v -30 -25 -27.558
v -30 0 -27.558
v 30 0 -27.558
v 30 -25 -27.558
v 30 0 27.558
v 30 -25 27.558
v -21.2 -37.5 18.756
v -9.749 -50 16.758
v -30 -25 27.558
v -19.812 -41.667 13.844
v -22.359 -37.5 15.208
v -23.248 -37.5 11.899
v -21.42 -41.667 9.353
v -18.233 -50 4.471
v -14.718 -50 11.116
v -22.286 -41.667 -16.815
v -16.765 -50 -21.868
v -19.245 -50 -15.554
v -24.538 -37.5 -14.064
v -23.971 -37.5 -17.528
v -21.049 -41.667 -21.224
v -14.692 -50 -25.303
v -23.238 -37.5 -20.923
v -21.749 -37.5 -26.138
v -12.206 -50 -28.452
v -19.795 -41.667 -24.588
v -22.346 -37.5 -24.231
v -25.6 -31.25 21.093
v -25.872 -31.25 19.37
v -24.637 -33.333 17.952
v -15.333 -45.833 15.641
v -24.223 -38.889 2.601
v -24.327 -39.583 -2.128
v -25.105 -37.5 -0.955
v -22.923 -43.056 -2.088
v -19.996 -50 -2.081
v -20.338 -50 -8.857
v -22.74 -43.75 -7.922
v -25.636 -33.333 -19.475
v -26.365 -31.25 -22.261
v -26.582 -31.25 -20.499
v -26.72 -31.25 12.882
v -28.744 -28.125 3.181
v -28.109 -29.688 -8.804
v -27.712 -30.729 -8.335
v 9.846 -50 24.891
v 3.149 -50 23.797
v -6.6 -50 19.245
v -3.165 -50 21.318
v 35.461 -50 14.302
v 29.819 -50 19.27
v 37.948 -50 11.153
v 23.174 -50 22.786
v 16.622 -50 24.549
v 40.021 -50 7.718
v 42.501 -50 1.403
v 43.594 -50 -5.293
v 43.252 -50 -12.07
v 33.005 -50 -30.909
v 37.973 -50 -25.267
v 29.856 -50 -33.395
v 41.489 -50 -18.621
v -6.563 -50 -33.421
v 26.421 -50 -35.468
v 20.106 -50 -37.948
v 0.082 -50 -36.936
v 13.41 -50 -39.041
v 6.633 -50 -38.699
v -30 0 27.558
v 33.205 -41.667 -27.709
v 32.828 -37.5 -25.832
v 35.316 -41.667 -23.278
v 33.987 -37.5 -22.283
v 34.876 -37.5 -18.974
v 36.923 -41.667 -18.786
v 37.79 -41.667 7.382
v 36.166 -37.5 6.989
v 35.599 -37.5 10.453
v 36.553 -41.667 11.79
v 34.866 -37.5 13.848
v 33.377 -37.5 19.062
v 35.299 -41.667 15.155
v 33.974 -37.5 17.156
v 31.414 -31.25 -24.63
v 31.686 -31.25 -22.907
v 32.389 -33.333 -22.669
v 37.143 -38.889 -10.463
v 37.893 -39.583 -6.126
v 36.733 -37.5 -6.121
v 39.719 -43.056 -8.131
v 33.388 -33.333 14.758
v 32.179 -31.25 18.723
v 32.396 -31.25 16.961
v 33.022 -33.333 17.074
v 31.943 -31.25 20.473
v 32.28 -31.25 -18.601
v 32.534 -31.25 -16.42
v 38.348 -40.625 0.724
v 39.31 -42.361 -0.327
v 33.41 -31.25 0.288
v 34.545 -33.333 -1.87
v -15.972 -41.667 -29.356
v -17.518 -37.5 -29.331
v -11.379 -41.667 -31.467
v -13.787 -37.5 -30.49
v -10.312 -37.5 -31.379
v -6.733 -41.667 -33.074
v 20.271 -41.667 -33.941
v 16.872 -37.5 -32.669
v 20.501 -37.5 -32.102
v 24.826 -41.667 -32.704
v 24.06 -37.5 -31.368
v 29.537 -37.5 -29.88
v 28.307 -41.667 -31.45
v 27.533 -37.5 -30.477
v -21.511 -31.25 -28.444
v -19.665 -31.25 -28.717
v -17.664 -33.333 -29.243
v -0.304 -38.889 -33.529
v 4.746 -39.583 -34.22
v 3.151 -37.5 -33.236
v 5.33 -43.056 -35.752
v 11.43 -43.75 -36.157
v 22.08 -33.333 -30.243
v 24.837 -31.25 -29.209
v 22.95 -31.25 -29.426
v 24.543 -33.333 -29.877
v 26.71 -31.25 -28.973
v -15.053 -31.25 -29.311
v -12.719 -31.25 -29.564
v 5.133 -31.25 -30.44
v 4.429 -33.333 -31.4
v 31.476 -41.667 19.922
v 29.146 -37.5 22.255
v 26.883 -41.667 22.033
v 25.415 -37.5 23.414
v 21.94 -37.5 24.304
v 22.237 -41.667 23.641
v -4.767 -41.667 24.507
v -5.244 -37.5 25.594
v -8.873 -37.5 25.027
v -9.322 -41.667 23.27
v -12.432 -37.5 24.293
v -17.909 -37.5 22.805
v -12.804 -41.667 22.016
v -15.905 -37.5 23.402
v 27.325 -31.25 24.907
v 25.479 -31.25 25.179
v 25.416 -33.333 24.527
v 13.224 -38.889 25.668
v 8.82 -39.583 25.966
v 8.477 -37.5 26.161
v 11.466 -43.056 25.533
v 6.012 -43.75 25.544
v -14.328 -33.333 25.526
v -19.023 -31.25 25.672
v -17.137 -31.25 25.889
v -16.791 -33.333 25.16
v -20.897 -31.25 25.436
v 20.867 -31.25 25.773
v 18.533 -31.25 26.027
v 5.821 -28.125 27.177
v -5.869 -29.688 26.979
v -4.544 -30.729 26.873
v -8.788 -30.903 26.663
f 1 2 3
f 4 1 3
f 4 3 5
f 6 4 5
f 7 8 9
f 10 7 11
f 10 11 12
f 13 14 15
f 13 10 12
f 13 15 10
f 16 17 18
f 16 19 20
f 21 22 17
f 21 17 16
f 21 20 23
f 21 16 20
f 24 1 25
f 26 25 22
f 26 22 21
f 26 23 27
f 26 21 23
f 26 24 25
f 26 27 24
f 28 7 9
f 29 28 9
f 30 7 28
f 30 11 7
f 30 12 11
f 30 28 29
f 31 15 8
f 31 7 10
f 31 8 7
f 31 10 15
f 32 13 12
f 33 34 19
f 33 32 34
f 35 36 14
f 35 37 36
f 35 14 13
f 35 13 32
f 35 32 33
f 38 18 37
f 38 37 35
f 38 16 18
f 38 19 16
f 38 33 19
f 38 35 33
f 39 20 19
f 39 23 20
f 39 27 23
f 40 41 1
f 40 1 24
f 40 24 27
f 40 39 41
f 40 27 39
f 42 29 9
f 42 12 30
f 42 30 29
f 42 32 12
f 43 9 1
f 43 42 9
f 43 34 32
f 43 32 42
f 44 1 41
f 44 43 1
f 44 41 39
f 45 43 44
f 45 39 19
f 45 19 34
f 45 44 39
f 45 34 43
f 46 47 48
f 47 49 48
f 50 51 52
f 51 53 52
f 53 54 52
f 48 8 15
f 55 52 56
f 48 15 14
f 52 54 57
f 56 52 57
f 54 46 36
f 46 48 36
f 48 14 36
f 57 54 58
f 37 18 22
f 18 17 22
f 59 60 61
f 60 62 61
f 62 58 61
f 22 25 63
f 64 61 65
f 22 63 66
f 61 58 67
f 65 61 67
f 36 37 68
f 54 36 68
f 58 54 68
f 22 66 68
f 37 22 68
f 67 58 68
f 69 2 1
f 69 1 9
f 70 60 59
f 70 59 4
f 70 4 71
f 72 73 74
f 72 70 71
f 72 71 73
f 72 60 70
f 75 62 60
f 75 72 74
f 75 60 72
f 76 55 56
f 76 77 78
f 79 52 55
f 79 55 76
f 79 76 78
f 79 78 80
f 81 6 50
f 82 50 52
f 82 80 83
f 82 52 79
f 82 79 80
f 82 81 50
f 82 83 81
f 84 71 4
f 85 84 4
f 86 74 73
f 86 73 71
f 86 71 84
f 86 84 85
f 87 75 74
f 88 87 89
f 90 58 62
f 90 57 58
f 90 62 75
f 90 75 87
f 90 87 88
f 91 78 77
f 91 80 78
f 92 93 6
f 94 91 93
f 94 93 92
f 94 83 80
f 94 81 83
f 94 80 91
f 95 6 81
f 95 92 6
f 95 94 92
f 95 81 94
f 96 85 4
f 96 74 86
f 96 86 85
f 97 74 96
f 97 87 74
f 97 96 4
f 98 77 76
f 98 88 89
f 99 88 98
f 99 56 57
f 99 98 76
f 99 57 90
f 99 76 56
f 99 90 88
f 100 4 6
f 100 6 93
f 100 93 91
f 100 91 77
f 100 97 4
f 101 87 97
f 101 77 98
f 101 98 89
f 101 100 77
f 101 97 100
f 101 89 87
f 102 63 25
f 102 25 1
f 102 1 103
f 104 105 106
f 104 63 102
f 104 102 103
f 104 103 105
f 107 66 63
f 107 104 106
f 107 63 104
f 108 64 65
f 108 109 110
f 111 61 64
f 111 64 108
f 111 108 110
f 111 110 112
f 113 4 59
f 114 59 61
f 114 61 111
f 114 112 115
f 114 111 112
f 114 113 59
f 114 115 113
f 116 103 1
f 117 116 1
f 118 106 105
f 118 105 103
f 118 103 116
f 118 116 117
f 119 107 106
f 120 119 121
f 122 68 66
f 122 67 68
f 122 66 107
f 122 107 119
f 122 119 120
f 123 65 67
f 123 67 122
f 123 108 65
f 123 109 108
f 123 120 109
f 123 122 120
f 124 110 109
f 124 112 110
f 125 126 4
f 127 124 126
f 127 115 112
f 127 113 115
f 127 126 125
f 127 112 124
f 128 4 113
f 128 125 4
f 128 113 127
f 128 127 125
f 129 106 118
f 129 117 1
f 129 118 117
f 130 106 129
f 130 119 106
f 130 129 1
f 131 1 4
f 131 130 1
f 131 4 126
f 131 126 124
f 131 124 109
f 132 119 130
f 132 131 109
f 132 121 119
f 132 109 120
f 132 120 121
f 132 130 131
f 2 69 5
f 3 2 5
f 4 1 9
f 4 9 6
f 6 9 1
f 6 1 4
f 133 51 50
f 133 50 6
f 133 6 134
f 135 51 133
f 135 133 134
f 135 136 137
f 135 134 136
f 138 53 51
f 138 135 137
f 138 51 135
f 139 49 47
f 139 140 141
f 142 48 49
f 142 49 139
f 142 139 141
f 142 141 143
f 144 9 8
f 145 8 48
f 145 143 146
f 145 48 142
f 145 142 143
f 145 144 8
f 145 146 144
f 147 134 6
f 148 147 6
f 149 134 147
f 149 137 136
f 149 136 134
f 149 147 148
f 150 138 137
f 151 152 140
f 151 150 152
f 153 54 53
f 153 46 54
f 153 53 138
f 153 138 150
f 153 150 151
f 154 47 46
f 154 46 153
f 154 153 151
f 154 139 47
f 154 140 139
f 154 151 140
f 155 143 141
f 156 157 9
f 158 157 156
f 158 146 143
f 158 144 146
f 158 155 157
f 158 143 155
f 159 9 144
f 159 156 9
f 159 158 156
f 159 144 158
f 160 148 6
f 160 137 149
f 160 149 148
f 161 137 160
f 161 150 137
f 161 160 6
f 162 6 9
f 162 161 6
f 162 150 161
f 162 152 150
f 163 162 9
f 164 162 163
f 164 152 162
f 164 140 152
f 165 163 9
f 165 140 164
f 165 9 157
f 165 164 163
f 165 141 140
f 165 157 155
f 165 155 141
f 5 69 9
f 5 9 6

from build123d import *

# Parameters (mm, degrees)
F0_W      = 60
F0_H      = 55.1169423331
F1_DEPTH  = 25
F1_FACE_W = 60
F1_FACE_H = 55.1169423331


# Not quite as in the source:
# - the arcs of a loft's sections are written as splines that run evenly, so that the points pair up as in the source's solid


with BuildPart() as f1:
    # F0 (on Front) → F1 (new body)
    with BuildSketch(Plane.XZ):
        Rectangle(F0_W, F0_H)
    extrude(amount=F1_DEPTH)


with BuildPart() as f4:
    # F1_face (on face) → F4 section 0
    with BuildSketch(Plane.XZ.offset(25)):
        Rectangle(F1_FACE_W, F1_FACE_H)
    # F3 (on offset) → F4 section 1
    with BuildSketch(Plane.XZ.offset(50)):
        with BuildLine():
            add(Edge.make_bspline(
                [(33.0049454892, -30.9087265839), (34.5648464401, -29.509604206), (35.9869107002, -27.9568833895), (38.5008560126, -24.6037629645), (39.5926749027, -22.8034462686), (41.4041541174, -19.0243087118), (42.1237696497, -17.0455812976), (43.1631686363, -12.985656746), (43.4829263895, -10.9045599983), (43.7103016279, -6.7198690755), (43.6179134909, -4.6163783752), (43.0245270782, -0.4677364066), (42.5235434753, 1.5773122783), (41.1321989185, 5.5304753085), (40.2418723685, 7.4384919039), (38.1060382588, 11.0442581573), (36.8605835118, 12.7419186555), (35.4614611339, 14.3018196063)],
                knots=[0, 0, 0, 0, 0.125, 0.125, 0.25, 0.25, 0.375, 0.375, 0.5, 0.5, 0.625, 0.625, 0.75, 0.75, 0.875, 0.875, 1, 1, 1, 1], degree=3))
            add(Edge.make_bspline(
                [(35.4614611339, 14.3018196063), (34.0623387561, 15.8617205572), (32.5096179395, 17.2837848173), (29.1564975146, 19.7977301297), (27.3561808187, 20.8895490198), (23.5770432619, 22.7010282345), (21.5983158477, 23.4206437668), (17.5383912961, 24.4600427534), (15.4572945483, 24.7798005066), (11.2726036256, 25.0071757451), (9.1691129253, 24.914787608), (5.0204709567, 24.3214011953), (2.9754222718, 23.8204175924), (-0.9777407584, 22.4290730356), (-2.8857573538, 21.5387464856), (-6.4915236072, 19.4029123759), (-8.1891841054, 18.1574576289), (-9.7490850563, 16.7583352511)],
                knots=[0, 0, 0, 0, 0.125, 0.125, 0.25, 0.25, 0.375, 0.375, 0.5, 0.5, 0.625, 0.625, 0.75, 0.75, 0.875, 0.875, 1, 1, 1, 1], degree=3))
            add(Edge.make_bspline(
                [(-9.7490850563, 16.7583352511), (-11.3089860071, 15.3592128732), (-12.7310502672, 13.8064920567), (-15.2449955797, 10.4533716317), (-16.3368144697, 8.6530549358), (-18.1482936844, 4.873917379), (-18.8679092167, 2.8951899648), (-19.9073082033, -1.1647345868), (-20.2270659565, -3.2458313345), (-20.454441195, -7.4305222573), (-20.3620530579, -9.5340129576), (-19.7686666453, -13.6826549262), (-19.2676830423, -15.7277036111), (-17.8763384856, -19.6808666413), (-16.9860119356, -21.5888832367), (-14.8501778258, -25.1946494901), (-13.6047230788, -26.8923099883), (-12.205600701, -28.4522109391)],
                knots=[0, 0, 0, 0, 0.125, 0.125, 0.25, 0.25, 0.375, 0.375, 0.5, 0.5, 0.625, 0.625, 0.75, 0.75, 0.875, 0.875, 1, 1, 1, 1], degree=3))
            add(Edge.make_bspline(
                [(-12.205600701, -28.4522109391), (-10.8064783231, -30.01211189), (-9.2537575066, -31.4341761501), (-5.9006370816, -33.9481214625), (-4.1003203857, -35.0399403526), (-0.321182829, -36.8514195673), (1.6575445853, -37.5710350996), (5.7174691369, -38.6104340862), (7.7985658846, -38.9301918394), (11.9832568074, -39.1575670779), (14.0867475077, -39.0651789408), (18.2353894763, -38.4717925281), (20.2804381612, -37.9708089252), (24.2336011913, -36.5794643685), (26.1416177868, -35.6891378184), (29.7473840402, -33.5533037087), (31.4450445384, -32.3078489617), (33.0049454892, -30.9087265839)],
                knots=[0, 0, 0, 0, 0.125, 0.125, 0.25, 0.25, 0.375, 0.375, 0.5, 0.5, 0.625, 0.625, 0.75, 0.75, 0.875, 0.875, 1, 1, 1, 1], degree=3))
        make_face()
    loft(ruled=True)


solid = Compound([f1.part, f4.part])
